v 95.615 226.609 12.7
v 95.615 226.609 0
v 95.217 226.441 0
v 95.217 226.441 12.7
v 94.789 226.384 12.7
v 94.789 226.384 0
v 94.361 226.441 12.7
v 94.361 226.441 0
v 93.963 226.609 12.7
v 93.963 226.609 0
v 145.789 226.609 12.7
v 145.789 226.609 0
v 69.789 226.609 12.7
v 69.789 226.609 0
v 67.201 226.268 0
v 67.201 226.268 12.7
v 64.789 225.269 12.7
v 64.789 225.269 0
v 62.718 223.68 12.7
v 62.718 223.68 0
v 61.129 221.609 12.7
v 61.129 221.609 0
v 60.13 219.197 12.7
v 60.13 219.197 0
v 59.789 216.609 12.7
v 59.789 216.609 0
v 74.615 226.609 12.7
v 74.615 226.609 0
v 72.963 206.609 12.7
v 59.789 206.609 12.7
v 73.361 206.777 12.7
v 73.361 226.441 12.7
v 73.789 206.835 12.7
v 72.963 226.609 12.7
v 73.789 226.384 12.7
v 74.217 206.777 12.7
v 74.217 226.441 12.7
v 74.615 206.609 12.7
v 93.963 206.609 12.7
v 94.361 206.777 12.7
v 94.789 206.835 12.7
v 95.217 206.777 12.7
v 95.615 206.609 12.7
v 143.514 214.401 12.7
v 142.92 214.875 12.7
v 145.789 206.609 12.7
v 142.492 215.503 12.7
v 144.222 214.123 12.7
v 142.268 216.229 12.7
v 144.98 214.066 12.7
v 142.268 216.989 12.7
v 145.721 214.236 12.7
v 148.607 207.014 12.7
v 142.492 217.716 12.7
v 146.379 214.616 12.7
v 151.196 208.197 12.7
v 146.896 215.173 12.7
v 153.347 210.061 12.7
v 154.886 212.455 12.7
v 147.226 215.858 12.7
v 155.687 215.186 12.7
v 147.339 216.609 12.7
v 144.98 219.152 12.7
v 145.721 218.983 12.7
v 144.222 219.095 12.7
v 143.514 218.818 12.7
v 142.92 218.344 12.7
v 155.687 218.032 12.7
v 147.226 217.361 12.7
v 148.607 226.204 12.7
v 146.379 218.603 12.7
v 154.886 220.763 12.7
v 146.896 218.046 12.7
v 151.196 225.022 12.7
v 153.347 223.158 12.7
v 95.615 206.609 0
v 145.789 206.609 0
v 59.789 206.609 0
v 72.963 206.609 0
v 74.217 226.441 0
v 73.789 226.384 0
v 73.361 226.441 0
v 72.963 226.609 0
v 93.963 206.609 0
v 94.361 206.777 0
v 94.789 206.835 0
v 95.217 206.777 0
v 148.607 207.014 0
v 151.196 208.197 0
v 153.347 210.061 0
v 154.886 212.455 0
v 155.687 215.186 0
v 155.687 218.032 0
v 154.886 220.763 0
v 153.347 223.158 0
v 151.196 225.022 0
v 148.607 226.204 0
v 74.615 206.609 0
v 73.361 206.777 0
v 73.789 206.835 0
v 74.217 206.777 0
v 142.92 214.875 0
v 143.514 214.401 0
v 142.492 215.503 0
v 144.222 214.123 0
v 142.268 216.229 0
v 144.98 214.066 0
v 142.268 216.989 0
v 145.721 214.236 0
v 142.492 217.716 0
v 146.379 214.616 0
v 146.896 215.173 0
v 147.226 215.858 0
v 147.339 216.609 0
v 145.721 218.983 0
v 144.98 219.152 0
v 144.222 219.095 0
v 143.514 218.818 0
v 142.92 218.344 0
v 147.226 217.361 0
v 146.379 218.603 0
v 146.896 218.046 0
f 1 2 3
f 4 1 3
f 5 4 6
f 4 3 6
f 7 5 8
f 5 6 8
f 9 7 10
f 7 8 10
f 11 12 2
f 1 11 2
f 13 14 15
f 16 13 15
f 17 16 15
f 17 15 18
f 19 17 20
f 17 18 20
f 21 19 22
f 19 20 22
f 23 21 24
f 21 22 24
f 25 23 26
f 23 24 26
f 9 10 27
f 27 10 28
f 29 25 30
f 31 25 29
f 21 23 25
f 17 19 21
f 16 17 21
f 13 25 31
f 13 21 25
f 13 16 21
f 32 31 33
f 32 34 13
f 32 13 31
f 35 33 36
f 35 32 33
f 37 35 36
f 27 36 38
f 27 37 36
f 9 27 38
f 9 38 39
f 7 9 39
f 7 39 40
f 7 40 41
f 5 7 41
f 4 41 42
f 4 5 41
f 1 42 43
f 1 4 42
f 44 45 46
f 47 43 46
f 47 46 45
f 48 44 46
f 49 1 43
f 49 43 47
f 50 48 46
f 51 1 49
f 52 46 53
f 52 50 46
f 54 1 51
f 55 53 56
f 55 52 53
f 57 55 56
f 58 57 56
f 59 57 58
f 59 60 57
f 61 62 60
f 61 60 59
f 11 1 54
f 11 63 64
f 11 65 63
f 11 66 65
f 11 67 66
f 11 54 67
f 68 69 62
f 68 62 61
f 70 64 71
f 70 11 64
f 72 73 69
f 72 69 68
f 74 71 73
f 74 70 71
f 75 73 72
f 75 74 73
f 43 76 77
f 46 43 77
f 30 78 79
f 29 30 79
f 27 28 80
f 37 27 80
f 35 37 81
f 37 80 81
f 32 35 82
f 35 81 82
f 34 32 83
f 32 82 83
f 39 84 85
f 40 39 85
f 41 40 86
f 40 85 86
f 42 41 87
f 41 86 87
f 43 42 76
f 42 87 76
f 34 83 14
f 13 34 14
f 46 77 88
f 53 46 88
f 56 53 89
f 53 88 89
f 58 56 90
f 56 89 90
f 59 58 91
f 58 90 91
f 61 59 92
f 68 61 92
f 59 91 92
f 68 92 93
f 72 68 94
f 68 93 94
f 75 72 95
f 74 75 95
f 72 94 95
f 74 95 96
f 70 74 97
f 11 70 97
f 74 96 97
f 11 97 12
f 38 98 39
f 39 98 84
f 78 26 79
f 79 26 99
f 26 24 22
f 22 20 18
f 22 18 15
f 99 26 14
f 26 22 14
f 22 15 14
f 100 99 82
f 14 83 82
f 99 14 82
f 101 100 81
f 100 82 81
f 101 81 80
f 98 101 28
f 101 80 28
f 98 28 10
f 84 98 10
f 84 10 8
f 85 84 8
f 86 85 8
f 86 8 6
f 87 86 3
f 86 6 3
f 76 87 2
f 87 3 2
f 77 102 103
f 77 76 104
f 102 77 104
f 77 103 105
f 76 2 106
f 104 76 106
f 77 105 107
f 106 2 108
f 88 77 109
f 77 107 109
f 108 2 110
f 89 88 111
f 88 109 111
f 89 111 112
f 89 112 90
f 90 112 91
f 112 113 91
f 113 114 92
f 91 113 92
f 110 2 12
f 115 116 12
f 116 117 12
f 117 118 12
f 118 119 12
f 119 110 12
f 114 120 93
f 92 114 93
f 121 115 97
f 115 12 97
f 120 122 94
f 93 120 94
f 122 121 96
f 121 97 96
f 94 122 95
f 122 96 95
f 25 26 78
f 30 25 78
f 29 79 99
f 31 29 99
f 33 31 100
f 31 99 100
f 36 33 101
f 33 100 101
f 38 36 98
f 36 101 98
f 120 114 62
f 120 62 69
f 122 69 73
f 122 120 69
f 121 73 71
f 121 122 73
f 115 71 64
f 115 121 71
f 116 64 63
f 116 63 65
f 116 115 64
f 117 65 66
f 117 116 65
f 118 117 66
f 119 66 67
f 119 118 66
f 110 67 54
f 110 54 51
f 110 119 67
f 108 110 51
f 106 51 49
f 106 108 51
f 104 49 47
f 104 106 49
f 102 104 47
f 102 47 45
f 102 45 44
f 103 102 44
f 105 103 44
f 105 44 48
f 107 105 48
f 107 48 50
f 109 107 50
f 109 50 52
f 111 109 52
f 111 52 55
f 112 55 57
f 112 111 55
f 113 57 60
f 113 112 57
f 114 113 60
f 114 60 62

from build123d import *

# Parameters (mm, degrees)
SKETCH1_R           = 2.55
BOSS_EXTRUDE1_DEPTH = 12.7


with BuildPart() as part:
    # Sketch1 → Boss-Extrude1 (new body)
    with BuildSketch(Plane.XY):
        with BuildLine():
            Line((59.789213932, 216.60923387), (59.789213932, 206.609233872))
            Line((59.789213932, 206.609233872), (72.963032743, 206.609233872))
            ThreePointArc((72.963032743, 206.609233872), (73.789213933, 206.834833872), (74.615395122, 206.609233872))
            Line((74.615395122, 206.609233872), (93.963032742, 206.609233872))
            ThreePointArc((93.963032742, 206.609233872), (94.789213933, 206.834833872), (95.615395124, 206.609233871))
            Line((95.615395124, 206.609233871), (145.789213933, 206.609233871))
            ThreePointArc((145.789213933, 206.609233871), (155.789213933, 216.609233871), (145.789213933, 226.609233871))
            Line((145.789213933, 226.609233871), (95.615395124, 226.609233871))
            ThreePointArc((95.615395124, 226.609233871), (94.789213933, 226.38363387), (93.963032742, 226.60923387))
            Line((93.963032742, 226.60923387), (74.615395122, 226.60923387))
            ThreePointArc((74.615395122, 226.60923387), (73.789213933, 226.38363387), (72.963032743, 226.60923387))
            Line((72.963032743, 226.60923387), (69.789213932, 226.60923387))
            ThreePointArc((69.789213932, 226.60923387), (62.71814612, 223.680301682), (59.789213932, 216.60923387))
        make_face()
        with Locations((144.789213934, 216.609233872)):
            Circle(SKETCH1_R, mode=Mode.SUBTRACT)
    extrude(amount=BOSS_EXTRUDE1_DEPTH)


solid = part.part
